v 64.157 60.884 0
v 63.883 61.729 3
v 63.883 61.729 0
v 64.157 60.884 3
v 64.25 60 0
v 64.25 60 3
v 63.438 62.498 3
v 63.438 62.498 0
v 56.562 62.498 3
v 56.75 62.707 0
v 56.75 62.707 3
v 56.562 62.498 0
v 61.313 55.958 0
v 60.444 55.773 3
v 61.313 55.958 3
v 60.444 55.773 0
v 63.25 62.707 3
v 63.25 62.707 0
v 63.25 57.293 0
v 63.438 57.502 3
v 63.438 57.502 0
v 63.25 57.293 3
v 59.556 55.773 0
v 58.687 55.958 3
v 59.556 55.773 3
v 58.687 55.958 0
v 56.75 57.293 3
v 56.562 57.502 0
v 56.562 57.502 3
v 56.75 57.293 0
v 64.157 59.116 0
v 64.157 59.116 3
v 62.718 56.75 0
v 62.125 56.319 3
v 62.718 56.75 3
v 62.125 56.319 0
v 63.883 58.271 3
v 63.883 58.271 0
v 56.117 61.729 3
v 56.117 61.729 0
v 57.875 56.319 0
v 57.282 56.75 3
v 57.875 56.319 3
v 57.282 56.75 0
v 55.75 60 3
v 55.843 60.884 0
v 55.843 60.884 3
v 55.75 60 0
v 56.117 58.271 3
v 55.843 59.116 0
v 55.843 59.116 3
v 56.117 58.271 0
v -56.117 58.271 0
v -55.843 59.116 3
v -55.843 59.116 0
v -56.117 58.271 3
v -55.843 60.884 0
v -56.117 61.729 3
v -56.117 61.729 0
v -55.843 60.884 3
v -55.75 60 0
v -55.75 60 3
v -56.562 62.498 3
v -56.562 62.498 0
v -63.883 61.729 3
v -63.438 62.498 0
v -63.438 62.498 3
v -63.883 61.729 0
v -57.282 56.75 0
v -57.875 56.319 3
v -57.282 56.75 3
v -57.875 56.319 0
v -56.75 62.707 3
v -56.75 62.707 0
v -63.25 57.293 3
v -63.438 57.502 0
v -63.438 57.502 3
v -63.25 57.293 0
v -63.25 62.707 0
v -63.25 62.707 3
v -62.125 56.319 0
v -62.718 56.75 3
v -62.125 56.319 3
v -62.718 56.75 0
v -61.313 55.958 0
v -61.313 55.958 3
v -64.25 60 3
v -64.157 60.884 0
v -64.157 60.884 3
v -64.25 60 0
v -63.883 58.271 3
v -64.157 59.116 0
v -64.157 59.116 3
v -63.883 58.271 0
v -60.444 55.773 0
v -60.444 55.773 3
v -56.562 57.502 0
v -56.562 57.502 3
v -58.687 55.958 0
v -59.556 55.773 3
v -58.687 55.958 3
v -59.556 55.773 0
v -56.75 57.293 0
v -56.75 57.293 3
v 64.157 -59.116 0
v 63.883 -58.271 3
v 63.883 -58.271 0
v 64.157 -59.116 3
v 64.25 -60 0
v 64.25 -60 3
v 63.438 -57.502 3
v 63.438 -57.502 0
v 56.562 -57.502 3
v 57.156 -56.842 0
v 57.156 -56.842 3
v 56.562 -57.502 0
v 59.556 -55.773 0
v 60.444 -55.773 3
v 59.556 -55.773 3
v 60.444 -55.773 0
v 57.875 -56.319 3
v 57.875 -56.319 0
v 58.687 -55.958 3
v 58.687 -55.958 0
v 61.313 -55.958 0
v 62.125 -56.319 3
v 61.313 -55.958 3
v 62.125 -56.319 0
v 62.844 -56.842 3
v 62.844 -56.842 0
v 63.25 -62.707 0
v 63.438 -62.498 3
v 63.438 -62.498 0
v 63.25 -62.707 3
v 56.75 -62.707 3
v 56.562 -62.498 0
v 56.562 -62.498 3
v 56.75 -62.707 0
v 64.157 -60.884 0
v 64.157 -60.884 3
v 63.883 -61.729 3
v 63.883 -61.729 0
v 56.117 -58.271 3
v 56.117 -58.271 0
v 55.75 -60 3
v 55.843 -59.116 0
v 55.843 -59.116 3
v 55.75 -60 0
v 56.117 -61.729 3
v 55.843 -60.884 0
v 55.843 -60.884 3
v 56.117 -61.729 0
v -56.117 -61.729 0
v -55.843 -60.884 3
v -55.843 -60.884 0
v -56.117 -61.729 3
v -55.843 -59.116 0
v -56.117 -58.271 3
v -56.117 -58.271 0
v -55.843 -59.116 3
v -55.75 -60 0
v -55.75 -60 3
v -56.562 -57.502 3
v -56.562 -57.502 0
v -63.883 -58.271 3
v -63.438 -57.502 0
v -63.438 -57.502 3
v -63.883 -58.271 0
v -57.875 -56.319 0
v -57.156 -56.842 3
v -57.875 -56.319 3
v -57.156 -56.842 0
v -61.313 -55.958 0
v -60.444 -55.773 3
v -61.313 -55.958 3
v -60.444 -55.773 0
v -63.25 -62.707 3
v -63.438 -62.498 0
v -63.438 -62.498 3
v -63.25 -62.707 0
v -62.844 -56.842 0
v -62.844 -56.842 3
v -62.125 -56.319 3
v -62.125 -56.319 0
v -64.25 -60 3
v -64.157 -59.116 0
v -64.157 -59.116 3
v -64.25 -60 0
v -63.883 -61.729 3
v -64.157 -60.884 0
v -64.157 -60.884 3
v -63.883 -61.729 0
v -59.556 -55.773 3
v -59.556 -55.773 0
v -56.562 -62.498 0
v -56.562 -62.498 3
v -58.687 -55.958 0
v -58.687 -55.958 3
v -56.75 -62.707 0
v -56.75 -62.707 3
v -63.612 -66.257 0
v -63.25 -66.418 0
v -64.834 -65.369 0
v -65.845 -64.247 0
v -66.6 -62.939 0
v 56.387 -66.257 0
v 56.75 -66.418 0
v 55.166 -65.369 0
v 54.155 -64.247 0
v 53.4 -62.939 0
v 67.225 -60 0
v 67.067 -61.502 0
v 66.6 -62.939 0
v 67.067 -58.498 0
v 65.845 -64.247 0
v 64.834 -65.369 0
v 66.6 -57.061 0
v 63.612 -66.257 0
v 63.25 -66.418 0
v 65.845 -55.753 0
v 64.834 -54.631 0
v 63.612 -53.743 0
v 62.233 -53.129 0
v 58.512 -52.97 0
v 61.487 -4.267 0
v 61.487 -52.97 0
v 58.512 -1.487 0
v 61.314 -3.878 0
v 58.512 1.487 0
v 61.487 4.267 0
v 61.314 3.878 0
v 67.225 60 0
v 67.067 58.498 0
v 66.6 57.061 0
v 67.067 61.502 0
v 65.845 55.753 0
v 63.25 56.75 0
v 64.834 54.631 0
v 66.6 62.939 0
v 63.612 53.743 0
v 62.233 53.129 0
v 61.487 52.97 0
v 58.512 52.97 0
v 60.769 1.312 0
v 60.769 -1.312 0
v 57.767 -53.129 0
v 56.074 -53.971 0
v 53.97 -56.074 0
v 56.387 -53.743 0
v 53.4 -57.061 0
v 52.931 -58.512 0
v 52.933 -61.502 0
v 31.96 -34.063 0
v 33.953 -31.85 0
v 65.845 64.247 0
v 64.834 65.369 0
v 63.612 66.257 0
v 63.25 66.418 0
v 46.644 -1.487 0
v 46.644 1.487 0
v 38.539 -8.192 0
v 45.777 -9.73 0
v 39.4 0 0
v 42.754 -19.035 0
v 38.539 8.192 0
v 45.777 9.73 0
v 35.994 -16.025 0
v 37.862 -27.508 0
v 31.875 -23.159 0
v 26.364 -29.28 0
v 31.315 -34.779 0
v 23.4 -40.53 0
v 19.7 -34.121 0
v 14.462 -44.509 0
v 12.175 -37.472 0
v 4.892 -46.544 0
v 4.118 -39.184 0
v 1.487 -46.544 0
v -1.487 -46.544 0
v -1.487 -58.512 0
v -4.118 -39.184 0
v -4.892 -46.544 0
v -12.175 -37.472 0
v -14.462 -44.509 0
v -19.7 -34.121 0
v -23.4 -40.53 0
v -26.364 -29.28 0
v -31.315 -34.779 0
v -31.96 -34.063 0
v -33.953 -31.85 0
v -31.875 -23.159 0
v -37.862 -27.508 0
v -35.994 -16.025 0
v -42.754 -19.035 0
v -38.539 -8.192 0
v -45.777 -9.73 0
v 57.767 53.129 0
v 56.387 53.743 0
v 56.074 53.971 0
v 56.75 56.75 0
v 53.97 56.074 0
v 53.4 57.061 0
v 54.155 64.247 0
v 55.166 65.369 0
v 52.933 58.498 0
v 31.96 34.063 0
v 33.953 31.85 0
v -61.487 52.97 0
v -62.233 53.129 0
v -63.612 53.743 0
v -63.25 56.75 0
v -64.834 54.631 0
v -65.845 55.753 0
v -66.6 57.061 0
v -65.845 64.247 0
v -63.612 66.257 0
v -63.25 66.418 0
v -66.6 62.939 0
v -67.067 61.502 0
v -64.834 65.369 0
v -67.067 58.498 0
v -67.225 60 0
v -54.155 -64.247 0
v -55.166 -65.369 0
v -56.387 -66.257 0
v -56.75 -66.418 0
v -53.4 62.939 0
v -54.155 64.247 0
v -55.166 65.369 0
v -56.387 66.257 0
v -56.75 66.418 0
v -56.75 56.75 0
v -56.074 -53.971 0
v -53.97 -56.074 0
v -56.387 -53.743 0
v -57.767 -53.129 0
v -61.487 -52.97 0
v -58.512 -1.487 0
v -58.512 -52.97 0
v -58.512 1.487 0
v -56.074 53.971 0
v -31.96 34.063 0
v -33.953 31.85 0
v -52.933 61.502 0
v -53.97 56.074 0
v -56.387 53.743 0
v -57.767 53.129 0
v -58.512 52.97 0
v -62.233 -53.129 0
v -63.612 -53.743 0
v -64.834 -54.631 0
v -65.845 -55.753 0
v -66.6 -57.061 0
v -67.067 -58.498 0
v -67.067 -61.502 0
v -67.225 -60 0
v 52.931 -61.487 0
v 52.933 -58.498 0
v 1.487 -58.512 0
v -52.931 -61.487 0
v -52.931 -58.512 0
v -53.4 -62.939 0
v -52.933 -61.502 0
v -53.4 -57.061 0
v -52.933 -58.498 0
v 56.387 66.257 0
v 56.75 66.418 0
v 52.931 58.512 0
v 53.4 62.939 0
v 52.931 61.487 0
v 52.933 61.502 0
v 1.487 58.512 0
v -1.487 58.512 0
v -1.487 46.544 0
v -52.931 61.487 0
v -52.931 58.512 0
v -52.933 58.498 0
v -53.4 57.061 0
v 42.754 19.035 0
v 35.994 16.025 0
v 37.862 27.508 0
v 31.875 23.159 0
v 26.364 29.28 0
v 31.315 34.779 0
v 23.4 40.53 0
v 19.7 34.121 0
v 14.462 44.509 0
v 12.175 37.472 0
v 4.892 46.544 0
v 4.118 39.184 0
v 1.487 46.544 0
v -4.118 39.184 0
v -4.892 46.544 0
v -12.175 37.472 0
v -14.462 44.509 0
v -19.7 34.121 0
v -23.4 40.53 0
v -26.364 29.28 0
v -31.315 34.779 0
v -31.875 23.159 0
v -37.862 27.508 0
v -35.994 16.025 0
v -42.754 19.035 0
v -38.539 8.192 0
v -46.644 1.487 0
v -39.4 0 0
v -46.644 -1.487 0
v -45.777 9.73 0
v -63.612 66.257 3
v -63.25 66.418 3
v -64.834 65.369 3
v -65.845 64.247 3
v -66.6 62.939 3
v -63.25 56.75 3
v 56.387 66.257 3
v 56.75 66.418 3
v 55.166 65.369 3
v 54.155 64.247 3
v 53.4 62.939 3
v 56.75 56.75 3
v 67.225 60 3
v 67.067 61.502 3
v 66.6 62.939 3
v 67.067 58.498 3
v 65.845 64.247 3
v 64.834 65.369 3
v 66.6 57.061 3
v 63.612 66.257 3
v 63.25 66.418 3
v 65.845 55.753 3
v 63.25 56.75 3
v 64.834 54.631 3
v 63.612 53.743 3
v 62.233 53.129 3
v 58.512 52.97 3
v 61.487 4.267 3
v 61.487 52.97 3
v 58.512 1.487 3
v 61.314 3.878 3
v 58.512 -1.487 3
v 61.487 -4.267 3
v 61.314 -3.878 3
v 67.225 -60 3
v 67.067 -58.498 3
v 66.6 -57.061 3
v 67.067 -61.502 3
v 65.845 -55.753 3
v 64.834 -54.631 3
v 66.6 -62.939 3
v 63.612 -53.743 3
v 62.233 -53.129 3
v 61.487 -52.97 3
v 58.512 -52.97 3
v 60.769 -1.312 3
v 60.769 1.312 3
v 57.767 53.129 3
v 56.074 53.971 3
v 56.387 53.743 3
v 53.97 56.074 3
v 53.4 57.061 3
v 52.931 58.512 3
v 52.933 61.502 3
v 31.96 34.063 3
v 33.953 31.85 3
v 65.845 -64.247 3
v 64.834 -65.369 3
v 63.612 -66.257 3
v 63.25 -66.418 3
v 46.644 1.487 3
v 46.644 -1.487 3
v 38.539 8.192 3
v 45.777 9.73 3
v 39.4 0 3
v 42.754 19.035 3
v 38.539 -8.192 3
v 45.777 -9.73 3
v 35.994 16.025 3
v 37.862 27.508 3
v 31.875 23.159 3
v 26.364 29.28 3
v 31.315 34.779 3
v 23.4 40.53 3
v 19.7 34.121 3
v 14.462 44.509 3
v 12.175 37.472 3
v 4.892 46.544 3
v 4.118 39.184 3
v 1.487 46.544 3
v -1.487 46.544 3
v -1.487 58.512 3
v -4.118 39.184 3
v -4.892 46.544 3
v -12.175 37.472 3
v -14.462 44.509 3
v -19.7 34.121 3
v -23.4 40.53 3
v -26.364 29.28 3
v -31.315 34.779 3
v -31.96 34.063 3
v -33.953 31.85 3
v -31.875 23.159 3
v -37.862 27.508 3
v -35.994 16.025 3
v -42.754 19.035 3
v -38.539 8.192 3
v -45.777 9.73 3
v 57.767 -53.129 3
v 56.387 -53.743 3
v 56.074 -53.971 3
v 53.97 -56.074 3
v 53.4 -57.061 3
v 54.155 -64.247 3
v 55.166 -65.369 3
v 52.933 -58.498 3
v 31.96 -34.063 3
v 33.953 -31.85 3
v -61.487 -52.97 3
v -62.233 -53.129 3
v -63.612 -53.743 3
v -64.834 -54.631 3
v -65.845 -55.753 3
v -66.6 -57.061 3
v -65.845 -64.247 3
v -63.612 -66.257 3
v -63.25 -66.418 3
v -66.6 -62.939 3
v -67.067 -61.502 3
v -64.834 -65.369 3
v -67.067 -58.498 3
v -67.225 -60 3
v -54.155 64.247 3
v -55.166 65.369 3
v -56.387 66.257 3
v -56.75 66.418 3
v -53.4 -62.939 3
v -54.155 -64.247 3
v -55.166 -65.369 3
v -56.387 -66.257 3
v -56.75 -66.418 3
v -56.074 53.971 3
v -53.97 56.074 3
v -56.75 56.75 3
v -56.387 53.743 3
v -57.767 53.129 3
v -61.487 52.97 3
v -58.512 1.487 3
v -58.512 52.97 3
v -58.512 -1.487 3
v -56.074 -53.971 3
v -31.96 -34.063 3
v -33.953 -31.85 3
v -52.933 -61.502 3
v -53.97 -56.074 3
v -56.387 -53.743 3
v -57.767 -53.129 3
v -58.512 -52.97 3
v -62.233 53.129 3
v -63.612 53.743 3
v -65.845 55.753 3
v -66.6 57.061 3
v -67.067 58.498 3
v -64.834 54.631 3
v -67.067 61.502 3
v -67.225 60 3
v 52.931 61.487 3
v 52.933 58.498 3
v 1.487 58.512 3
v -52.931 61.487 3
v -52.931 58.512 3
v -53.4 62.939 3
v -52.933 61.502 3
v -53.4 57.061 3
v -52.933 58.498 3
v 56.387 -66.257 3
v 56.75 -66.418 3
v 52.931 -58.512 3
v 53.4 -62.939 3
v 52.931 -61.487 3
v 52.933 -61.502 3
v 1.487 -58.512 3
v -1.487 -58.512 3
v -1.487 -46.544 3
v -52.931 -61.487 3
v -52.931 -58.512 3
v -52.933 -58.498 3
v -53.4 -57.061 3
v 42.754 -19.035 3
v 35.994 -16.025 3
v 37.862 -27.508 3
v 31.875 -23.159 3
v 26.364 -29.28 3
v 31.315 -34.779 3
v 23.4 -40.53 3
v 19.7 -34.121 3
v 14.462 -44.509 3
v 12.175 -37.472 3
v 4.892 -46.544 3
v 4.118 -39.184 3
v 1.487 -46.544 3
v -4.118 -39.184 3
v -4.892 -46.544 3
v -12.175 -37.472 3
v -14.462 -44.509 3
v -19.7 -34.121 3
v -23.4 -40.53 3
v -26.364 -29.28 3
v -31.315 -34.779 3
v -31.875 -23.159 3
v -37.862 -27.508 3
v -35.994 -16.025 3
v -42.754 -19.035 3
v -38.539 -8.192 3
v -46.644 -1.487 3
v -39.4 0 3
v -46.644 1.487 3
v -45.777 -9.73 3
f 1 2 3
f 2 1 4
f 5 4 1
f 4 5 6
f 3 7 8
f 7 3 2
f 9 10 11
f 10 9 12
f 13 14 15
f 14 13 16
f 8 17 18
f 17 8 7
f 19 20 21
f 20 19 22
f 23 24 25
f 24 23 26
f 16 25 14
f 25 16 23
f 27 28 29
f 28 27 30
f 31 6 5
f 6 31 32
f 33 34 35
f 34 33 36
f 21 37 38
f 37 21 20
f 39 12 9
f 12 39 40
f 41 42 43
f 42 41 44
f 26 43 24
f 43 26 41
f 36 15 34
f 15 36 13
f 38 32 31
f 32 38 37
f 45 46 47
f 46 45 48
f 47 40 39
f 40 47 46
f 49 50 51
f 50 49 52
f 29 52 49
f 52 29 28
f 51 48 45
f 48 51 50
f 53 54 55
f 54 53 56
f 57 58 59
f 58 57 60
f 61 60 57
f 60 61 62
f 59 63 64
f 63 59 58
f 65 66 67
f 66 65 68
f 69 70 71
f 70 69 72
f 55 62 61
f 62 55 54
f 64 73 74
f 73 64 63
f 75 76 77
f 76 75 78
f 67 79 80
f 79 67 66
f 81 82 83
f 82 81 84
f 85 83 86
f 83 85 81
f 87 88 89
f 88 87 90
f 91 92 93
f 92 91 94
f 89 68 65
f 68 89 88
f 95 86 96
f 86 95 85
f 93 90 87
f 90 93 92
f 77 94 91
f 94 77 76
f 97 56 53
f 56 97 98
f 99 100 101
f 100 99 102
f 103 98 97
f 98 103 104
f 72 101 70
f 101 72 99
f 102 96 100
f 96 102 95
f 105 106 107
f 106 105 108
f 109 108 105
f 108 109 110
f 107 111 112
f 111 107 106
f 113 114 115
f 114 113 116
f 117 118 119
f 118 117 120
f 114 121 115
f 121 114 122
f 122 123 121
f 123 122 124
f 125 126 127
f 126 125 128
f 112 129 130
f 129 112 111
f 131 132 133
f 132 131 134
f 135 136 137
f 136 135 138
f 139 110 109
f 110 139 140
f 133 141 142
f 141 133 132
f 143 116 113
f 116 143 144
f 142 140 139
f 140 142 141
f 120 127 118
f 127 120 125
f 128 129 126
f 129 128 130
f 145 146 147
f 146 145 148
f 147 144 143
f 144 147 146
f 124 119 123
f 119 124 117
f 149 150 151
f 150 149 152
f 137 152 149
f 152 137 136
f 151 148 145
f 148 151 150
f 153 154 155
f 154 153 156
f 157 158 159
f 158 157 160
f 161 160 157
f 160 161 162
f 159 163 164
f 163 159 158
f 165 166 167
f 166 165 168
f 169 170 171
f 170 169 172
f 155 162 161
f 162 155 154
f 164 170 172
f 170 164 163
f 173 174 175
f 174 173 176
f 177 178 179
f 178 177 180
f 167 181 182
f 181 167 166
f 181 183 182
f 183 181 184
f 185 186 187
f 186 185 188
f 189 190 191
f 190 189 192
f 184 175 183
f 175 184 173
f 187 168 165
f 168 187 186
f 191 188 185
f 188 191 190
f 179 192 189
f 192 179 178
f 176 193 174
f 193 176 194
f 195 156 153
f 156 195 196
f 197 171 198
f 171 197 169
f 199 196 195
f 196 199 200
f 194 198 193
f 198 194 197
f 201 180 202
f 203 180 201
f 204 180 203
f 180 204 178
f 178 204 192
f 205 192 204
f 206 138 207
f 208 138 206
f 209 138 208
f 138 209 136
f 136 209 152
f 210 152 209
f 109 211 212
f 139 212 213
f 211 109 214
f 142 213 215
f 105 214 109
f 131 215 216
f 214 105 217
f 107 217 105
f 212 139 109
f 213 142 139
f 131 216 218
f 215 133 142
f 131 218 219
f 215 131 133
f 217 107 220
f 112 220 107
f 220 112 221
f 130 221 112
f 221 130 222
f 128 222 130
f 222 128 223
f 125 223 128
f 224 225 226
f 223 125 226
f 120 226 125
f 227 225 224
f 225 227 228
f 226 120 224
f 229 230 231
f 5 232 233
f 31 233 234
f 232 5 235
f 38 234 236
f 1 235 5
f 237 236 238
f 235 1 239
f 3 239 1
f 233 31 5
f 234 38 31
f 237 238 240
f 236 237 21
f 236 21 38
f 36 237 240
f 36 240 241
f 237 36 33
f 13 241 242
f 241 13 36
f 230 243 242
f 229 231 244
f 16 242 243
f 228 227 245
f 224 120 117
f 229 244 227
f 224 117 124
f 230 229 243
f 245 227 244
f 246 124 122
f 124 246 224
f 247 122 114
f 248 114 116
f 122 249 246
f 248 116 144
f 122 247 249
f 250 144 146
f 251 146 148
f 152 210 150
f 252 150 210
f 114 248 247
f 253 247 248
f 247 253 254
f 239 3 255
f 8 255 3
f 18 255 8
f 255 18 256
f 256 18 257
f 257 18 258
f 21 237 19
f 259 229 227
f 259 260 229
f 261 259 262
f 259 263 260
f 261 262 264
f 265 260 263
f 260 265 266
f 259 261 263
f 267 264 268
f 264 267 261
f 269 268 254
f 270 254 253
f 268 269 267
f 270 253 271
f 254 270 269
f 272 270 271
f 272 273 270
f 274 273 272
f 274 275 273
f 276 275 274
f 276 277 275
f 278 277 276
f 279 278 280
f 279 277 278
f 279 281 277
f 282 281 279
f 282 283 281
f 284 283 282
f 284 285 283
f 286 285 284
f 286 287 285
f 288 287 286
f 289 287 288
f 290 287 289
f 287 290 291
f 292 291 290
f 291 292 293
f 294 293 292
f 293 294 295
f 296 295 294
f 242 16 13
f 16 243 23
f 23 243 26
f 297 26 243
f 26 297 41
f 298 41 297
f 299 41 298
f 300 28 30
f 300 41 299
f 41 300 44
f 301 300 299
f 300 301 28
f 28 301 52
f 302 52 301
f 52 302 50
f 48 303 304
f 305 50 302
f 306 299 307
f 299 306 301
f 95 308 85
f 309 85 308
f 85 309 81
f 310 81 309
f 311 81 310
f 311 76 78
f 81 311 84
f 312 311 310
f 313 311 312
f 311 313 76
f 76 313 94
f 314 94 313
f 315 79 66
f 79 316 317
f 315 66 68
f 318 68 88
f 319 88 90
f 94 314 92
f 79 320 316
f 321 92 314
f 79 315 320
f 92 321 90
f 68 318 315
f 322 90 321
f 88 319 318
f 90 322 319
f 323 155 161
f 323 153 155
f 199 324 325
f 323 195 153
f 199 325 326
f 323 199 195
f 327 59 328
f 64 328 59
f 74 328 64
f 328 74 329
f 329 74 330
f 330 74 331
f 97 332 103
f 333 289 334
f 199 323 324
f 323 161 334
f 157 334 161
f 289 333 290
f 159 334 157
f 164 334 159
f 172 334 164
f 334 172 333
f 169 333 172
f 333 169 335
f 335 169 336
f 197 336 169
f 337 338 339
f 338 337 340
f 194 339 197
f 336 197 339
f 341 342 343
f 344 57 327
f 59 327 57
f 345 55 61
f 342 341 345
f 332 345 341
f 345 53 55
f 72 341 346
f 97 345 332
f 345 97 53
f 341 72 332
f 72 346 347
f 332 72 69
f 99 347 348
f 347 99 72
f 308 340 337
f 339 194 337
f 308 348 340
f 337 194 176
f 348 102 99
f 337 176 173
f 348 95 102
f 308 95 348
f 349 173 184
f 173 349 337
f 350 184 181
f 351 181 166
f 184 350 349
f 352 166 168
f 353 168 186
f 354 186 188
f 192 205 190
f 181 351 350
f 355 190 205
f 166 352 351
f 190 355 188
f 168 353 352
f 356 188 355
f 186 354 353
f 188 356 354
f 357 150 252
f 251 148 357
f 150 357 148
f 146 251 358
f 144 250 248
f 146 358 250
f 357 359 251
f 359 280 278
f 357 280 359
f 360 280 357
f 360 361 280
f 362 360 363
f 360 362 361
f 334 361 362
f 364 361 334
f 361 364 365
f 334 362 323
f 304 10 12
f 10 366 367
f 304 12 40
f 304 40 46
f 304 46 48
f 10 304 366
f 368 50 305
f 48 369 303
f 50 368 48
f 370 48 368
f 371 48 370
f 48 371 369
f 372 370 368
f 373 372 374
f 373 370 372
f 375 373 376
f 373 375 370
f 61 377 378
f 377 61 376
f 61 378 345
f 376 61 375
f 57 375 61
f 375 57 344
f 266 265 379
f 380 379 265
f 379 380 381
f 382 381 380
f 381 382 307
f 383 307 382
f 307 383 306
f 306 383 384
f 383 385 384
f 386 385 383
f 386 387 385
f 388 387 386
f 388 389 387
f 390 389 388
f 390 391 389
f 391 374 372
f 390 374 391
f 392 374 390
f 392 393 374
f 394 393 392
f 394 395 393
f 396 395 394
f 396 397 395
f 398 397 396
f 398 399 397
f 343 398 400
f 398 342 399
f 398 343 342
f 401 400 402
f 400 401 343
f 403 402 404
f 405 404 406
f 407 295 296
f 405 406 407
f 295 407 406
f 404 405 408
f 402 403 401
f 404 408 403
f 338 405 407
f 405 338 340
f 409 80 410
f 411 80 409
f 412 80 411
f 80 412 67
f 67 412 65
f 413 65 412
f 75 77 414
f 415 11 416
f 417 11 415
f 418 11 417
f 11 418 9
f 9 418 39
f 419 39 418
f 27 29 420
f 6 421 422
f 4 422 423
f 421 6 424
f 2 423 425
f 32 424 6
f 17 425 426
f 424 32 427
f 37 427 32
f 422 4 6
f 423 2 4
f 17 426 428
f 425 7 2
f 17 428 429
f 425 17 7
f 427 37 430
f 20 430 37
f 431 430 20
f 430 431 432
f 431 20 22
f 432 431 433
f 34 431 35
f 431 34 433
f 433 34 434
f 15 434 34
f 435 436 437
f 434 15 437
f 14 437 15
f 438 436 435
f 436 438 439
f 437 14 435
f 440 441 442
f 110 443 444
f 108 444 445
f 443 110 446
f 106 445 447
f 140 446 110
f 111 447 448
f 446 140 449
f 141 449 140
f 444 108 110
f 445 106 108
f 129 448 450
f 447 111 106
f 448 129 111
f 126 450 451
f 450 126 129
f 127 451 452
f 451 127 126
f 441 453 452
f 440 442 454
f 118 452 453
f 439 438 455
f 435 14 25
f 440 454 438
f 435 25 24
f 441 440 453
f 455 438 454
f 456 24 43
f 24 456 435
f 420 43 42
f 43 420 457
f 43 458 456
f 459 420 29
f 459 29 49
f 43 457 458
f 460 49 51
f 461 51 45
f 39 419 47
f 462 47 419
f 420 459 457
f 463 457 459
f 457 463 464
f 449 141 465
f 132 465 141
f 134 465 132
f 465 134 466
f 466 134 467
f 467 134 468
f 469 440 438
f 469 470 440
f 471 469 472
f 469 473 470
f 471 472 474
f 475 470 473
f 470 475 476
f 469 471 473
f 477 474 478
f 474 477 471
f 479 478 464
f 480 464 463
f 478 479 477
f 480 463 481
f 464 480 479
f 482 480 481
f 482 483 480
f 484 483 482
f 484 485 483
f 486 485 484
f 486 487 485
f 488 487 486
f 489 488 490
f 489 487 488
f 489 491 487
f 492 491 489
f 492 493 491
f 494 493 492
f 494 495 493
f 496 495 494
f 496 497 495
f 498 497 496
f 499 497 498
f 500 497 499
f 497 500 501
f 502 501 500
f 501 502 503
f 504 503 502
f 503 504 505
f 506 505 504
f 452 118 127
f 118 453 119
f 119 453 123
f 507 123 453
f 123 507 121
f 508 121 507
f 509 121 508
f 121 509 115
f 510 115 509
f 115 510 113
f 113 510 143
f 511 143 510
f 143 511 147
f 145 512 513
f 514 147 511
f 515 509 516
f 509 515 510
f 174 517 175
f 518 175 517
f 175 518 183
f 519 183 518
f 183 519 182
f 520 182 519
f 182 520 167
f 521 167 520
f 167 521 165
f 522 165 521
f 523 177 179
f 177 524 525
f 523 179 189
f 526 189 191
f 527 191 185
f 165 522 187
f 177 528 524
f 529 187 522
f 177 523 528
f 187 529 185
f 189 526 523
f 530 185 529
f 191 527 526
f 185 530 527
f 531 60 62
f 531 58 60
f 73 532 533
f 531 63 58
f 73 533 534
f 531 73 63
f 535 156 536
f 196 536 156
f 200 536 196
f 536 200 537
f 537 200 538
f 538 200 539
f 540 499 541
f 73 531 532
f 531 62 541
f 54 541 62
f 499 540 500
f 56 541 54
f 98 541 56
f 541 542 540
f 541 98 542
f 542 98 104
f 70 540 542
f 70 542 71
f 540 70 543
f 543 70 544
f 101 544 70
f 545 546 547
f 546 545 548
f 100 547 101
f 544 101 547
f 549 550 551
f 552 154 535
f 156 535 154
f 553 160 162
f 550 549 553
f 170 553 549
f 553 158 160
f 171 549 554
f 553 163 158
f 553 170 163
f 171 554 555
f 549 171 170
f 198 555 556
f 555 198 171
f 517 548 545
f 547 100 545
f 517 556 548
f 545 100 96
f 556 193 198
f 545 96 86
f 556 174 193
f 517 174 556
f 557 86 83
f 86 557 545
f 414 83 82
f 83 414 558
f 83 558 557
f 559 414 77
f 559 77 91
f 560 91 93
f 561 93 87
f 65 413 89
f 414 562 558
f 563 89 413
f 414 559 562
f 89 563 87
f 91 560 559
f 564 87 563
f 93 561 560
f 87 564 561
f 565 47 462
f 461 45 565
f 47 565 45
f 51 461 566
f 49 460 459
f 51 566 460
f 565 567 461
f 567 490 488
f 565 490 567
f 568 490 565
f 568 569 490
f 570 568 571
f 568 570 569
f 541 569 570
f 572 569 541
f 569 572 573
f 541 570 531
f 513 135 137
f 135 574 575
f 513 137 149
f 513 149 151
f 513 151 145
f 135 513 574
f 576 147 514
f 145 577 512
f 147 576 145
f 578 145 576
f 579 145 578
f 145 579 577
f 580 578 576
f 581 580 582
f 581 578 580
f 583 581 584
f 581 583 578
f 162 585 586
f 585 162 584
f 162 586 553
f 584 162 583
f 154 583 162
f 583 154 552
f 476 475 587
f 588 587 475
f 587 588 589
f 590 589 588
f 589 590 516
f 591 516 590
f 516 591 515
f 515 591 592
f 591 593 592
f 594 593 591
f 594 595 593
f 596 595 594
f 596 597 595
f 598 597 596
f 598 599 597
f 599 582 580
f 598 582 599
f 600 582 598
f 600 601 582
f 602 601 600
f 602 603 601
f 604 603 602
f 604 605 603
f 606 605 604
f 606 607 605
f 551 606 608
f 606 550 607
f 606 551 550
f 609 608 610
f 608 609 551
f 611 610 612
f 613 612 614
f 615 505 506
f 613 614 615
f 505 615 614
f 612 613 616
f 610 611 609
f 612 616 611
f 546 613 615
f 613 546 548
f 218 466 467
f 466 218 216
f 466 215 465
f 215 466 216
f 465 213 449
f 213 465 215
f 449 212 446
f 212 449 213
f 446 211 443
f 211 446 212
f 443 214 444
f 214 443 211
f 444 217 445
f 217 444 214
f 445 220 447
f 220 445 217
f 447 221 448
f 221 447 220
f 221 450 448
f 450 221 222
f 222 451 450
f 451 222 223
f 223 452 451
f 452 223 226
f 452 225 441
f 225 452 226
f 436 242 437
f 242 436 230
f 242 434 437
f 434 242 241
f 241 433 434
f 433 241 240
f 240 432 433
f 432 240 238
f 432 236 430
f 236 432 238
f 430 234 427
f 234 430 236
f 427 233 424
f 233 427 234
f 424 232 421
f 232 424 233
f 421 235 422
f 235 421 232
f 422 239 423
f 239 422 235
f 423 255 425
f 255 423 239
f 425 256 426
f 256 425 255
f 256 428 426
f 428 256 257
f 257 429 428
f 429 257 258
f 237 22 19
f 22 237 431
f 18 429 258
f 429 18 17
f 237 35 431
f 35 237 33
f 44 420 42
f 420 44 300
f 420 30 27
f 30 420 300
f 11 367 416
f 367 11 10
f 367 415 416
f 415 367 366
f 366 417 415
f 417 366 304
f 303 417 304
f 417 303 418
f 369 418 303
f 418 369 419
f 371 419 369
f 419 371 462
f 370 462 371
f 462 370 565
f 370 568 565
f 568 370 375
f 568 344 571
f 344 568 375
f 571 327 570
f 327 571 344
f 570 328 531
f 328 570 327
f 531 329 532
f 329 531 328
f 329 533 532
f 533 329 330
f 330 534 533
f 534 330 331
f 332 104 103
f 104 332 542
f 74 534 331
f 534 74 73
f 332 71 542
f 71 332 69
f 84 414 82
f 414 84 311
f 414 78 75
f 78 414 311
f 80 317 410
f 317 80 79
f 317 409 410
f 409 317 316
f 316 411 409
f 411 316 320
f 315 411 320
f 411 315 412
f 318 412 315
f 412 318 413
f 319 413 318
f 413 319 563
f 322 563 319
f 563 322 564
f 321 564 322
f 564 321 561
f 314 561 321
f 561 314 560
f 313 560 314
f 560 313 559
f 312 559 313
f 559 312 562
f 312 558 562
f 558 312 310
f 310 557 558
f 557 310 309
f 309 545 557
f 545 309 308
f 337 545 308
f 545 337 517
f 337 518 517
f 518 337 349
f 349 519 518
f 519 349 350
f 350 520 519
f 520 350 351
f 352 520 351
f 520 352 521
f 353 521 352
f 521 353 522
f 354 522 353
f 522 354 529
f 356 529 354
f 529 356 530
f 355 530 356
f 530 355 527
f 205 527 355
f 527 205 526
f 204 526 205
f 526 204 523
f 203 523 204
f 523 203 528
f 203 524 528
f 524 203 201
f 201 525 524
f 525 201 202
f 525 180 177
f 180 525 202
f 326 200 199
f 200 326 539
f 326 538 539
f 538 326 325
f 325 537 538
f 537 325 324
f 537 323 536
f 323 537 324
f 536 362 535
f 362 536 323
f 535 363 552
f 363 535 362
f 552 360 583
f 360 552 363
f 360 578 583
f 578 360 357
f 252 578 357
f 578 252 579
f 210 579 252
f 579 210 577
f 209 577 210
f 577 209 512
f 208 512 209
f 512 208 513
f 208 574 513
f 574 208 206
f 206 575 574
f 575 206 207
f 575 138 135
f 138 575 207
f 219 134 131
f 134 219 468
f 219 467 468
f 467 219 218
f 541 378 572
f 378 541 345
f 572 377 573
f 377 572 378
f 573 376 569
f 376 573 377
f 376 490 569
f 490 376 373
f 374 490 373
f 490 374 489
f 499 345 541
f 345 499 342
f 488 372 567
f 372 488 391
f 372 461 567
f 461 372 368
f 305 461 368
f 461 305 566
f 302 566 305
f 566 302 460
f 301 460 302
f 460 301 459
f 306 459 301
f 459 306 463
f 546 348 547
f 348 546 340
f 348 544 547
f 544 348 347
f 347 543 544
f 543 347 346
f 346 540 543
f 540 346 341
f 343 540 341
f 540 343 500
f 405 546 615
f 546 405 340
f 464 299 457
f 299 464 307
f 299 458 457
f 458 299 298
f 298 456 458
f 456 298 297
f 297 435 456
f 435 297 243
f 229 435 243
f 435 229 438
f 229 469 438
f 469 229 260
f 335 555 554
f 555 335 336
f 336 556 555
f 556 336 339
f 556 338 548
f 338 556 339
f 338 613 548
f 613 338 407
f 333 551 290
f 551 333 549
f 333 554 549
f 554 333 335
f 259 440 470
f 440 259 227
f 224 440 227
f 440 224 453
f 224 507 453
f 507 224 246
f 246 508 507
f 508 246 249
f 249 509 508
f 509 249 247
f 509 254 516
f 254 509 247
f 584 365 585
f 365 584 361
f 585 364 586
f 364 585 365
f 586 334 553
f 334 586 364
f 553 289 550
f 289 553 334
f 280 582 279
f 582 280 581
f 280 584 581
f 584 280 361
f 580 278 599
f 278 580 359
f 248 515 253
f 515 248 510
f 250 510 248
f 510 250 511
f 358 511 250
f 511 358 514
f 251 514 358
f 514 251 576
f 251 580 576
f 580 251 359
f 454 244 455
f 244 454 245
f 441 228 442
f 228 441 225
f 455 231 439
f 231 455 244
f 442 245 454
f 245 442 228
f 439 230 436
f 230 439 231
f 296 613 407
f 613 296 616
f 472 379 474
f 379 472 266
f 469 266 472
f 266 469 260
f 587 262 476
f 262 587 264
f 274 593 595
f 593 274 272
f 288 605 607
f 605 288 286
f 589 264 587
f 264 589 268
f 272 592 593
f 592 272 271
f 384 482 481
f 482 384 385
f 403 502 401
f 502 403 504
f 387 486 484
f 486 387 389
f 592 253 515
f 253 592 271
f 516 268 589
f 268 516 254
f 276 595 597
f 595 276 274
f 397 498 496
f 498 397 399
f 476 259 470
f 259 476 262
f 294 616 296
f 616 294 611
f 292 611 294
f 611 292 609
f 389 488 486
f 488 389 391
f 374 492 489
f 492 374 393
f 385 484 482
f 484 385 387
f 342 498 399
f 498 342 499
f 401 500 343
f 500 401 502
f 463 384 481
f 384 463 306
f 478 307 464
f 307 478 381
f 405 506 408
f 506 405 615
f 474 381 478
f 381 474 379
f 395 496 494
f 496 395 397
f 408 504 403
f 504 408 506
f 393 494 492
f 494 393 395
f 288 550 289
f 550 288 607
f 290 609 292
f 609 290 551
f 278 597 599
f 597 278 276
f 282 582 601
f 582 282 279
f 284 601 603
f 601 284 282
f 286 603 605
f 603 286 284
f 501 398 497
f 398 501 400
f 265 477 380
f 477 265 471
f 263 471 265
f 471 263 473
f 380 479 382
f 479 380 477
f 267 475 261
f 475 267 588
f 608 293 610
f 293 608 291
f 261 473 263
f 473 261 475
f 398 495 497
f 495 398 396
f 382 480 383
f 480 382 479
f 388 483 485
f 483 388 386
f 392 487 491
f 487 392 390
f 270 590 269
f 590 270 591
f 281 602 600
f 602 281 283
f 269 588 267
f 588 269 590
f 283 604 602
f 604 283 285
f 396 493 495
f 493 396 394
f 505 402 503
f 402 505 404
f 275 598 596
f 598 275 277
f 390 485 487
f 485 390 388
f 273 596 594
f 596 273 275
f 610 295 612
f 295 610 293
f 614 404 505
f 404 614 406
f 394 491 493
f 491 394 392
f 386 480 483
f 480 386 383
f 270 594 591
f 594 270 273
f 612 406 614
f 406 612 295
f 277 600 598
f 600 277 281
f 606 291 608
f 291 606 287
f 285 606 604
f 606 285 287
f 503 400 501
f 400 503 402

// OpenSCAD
// file: trapezoid_groove.scad
module trapezoid_groove(
    d = 20,
    belt_width=2,
    slope=.5,
    ){
        inside_corner=belt_width/2;
        outside_corner_x=
            inside_corner
            +belt_width*4;
        outside_corner_y=
            inside_corner 
            + outside_corner_x*slope;
        
        rotate_extrude()
        translate([d/2,0,0])
        polygon(points=[
            [0,-inside_corner],[0,inside_corner],
            [outside_corner_x,outside_corner_y],
            [outside_corner_x,-outside_corner_y],
        ]);
}
// file: bearing.scad
$fn=30;
drive_axle_r = 8.1/2;
drive_axle_bearing_id = 8;
drive_axle_bearing_od = 22.5;
drive_axle_bearing_t = 8;

bearing_holder_wall = 1.2;
bearing_holder_tie_hole_r = 3/2;
bearing_holder_cut = -1;

bearing_pillow_rim_t = 2;
bearing_pillow_side_t = 1.5;
bearing_pillow_screw_thread_r = 3/2;
bearing_pillow_screw_shank_r = 4/2;
bearing_pillow_screw_head_r = 6/2;

module bearing(id = drive_axle_bearing_id, od = drive_axle_bearing_od, t = drive_axle_bearing_t) {
    difference() {
        cylinder(r=od/2, h=t, center=true);
        cylinder(r=id/2, h=t*2, center=true);
    }
}

module bearing_holder(
    od = drive_axle_bearing_od,
    t = drive_axle_bearing_t,
    wall=bearing_holder_wall,
    tie_hole_r = bearing_holder_tie_hole_r
) {
    extra_length = wall*4 + tie_hole_r*4;
    tie_width = wall*2 + tie_hole_r*6;
    difference() {
        union() {
            cylinder(r=od/2+wall, h=t+wall*2, center=true);
            cube([od+extra_length,tie_width,t+wall*2], center=true);
        }
        cylinder(r=od/2-wall, h=t*3, center=true);
        bearing();
        translate([od/2+wall+tie_hole_r,tie_hole_r*2,0])
        cylinder(r=tie_hole_r, h=t*2, center=true);
        translate([-od/2-wall-tie_hole_r,tie_hole_r*2,0])
        cylinder(r=tie_hole_r, h=t*2, center=true);

        translate([od/2+wall+tie_hole_r,-tie_hole_r*2,0])
        cylinder(r=tie_hole_r, h=t*2, center=true);
        translate([-od/2-wall-tie_hole_r,-tie_hole_r*2,0])
        cylinder(r=tie_hole_r, h=t*2, center=true);
    }
}

module bearing_holder_negative(
    od = drive_axle_bearing_od,
    t = drive_axle_bearing_od +bearing_pillow_rim_t*2,
    wall=bearing_pillow_side_t,
    //tie_hole_r = bearing_holder_tie_hole_r
) {
    //extra_length = wall*4 + tie_hole_r*4-.2;
    //tie_width = wall*2 + tie_hole_r*6-.2;
        union() {
            cylinder(r=od/2+wall-.2, h=t+wall*2, center=true);
          //  cube([od+extra_length,tie_width,t+wall*2], center=true);
        }
     
}
//bearing_holder_negative();

module bearing_holder_bottom(
    od = drive_axle_bearing_od,
    t = drive_axle_bearing_t,
    wall=bearing_holder_wall,
    cut = bearing_holder_cut
) {
    
    difference() {
        bearing_holder();
        translate([0,0,od*3/2-cut])
        cube([od*2,od*3,od*3], center=true);
        translate([0,0,-cut])
        bearing_holder_keyway();
    }
}
//bearing_holder_bottom();

module bearing_holder_top(
    od = drive_axle_bearing_od,
    t = drive_axle_bearing_t,
    wall=bearing_holder_wall,
    cut = bearing_holder_cut
) {
    
    difference() {
        bearing_holder(od=od, t=t, wall=wall, cut=cut);
        translate([0,0,-od*3/2-cut])
        cube([od*2,od*3,od*3], center=true);
    }
    translate([0,0,-cut])
    bearing_holder_key();
}
//rotate(180,[1,0,0])
//bearing_holder_top();

module bearing_holder_pair(
    od = drive_axle_bearing_od,
    t = drive_axle_bearing_t,
    wall=bearing_holder_wall
){
    translate([0,-od/2-wall-2,t/2+wall])
    rotate(180, [0,1,0])
    bearing_holder_top();
    translate([0,od/2+wall+2,t/2+wall])
    bearing_holder_bottom();
}
//bearing_holder_pair();

module bearing_holder_key(
    od = drive_axle_bearing_od,
    t = drive_axle_bearing_t,
    wall=bearing_holder_wall,
    tie_hole_r = bearing_holder_tie_hole_r
) {
    translate([od/2+wall+tie_hole_r,0,0])
    cube([tie_hole_r*2,tie_hole_r,tie_hole_r], center=true);
    translate([-od/2-wall-tie_hole_r,0,0])
    cube([tie_hole_r*2,tie_hole_r,tie_hole_r], center=true);
}
module bearing_holder_keyway(
    od = drive_axle_bearing_od,
    t = drive_axle_bearing_t,
    wall=bearing_holder_wall,
    tie_hole_r = bearing_holder_tie_hole_r,
    clearance = 1
) {
    translate([od/2+wall+tie_hole_r,0,0])
    cube([tie_hole_r*2+clearance,tie_hole_r+clearance,tie_hole_r+clearance], center=true);
    translate([-od/2-wall-tie_hole_r,0,0])
    cube([tie_hole_r*2+clearance,tie_hole_r+clearance,tie_hole_r+clearance], center=true);
}

module bearing_pillow() {

    difference() {
        union() {
            cylinder(r=drive_axle_bearing_od/2 + bearing_pillow_rim_t, h=drive_axle_bearing_t + bearing_pillow_side_t*2, center=true);
            cube([drive_axle_bearing_od+bearing_pillow_rim_t*2+bearing_pillow_screw_head_r*4+2,12,drive_axle_bearing_t + bearing_pillow_side_t*2], center=true);
        }
      cylinder(r=drive_axle_bearing_od/2 - 1, h=drive_axle_bearing_t*8, center=true);
      bearing();
        
      translate([drive_axle_bearing_od/2+bearing_pillow_rim_t+bearing_pillow_screw_head_r,0,0])
        rotate(90,[1,0,0]) 
            cylinder(r=bearing_pillow_screw_thread_r, h=50, center=true);
      translate([drive_axle_bearing_od/2+bearing_pillow_rim_t+bearing_pillow_screw_head_r,10,0])
        rotate(90,[1,0,0]) 
            cylinder(r=bearing_pillow_screw_shank_r, h=20, center=true);
      translate([drive_axle_bearing_od/2+bearing_pillow_rim_t+bearing_pillow_screw_head_r,15,0])
        rotate(90,[1,0,0]) 
            cylinder(r=bearing_pillow_screw_head_r, h=20, center=true);

      translate([-drive_axle_bearing_od/2-bearing_pillow_rim_t-bearing_pillow_screw_head_r,0,0])
        rotate(90,[1,0,0]) 
            cylinder(r=bearing_pillow_screw_thread_r, h=50, center=true);
      translate([-drive_axle_bearing_od/2-bearing_pillow_rim_t-bearing_pillow_screw_head_r,10,0])
        rotate(90,[1,0,0]) 
            cylinder(r=bearing_pillow_screw_shank_r, h=20, center=true);
      translate([-drive_axle_bearing_od/2-bearing_pillow_rim_t-bearing_pillow_screw_head_r,15,0])
        rotate(90,[1,0,0]) 
            cylinder(r=bearing_pillow_screw_head_r, h=20, center=true);
    }
}
module bearing_pillow_negative() {

    cylinder(r=drive_axle_bearing_od/2 + bearing_pillow_rim_t, h=drive_axle_bearing_t + bearing_pillow_side_t*2, center=true);
    cylinder(r=drive_axle_bearing_od/2 + bearing_pillow_rim_t-1, h=drive_axle_bearing_t *4, center=true);
    cube([drive_axle_bearing_od+bearing_pillow_rim_t*2+bearing_pillow_screw_head_r*4+2,12,drive_axle_bearing_t + bearing_pillow_side_t*2], center=true);

}
//%bearing_pillow();
//bearing_pillow_negative();
module bearing_pillow_top() {
   difference() {
        bearing_pillow();
        translate([0,-50,0])
            cube([100,100,100], center=true);
   } 
}
module bearing_pillow_bottom() {
   difference() {
        bearing_pillow();
        translate([0,50,0])
            cube([100,100,100], center=true);
   } 
}
//bearing_pillow_top();
//translate([0,-5,0])
//bearing_pillow_bottom();
//bearing_pillow();
//bearing_holder();
//bearing();
// file: rods.scad
//include <tracer.scad>
//include <tracer_bearing.scad>
include <bearing.scad>

$fn = 60;

frame_x = 60*2;
frame_y = frame_x;

frame_rod_r = 6.5/2;
frame_length = 500;

drive_axle_r = 8.5/2;
//inboard
//drive_position_x = frame_x/2 - drive_axle_bearing_od/2 - bearing_holder_wall - frame_rod_r;
//drive_position_y = frame_y/2 - drive_axle_bearing_od/2 - bearing_holder_wall - frame_rod_r;
//outboard
drive_position_x = frame_x/2+ drive_axle_bearing_od/2+bearing_pillow_rim_t;
drive_position_y = 0;
drive_axle_bearing_od = 22;

module frame_rod(r = frame_rod_r, h = frame_length) {
    cylinder(r =r, h = h);
}
module drive_axle(r = drive_axle_r, h = frame_length) {
    cylinder(r =r, h = h);
}
//frame_rod();


module frame_rods(x=frame_x, y = frame_y, r = frame_rod_r) {
    translate([x/2,y/2,0])
        frame_rod(r = r);
    translate([-x/2,y/2,0])
        frame_rod(r = r);
    translate([x/2,-y/2,0])
        frame_rod(r = r);
    translate([-x/2,-y/2,0])
        frame_rod(r = r);
    translate([drive_position_x,drive_position_y,0])
        drive_axle();
}

//frame_rods();
// file: rb-pulleys.scad
include <trapezoid_groove.scad>

module belt_pulley(
    d = 20,
    shaft_d=4,
    belt_width=2,
    slope=.5,
    t=5
    ){
    
    difference() {
        cylinder(r=d/2+belt_width,h=t, center=true);
        
        cylinder(r=shaft_d/2,h=belt_width*5, center=true);
        
        trapezoid_groove(
            d = d,
            belt_width=belt_width,
            slope=slope
        );
    }
}

module double_pulley(
    d1=15,
    d2=10,
    t=5,
    shaft_d=4,
    belt_width=2,
    slope=.5,
    ) {
    
    translate([0,0,t/2])
    belt_pulley(
        d=d1,
        t=t,
        shaft_d=shaft_d,
        belt_width=belt_width,
        slope=slope
    );
    translate([0,0,t+t/2])
    belt_pulley(
        d=d2,
        t=t,
        shaft_d=shaft_d,
        belt_width=belt_width,
        slope=slope
    );    

}



//belt_pulley();
//reducer_pulley(d1=10,d2=20);
//dia_1=30;

//double_pulley(d1=dia_1,d2=dia_1/4,belt_width=25.4/8,t=7);



//double_pulley(d1=7,d2=15,t=2);
//double_pulley(d1=20,d2=8);
// file: hollow_bearing.scad
include <trapezoid_groove.scad>

inner_hole_r = 10;
shell_wall = 2;
inner_shell_wall = shell_wall;
outer_shell_wall = shell_wall/2;
shell_t = 2; 
flange_w = shell_t*2;
inner_outer_tolerance = .8;
journal_t = 2;
journal_tolerance = 1.2;
journal_tolerance_z = .6;

retainer_t = 1;
retainer_d = inner_shell_wall /2;
retainer_w = retainer_d*2+inner_outer_tolerance;
retainer_tolerance=.4;

shell_r = inner_hole_r + inner_shell_wall + outer_shell_wall + inner_outer_tolerance + flange_w ;
inner_shell_h = journal_t + shell_t*2 + retainer_t*2 + journal_tolerance_z+retainer_tolerance*2;
outer_shell_h = journal_t + shell_t +journal_tolerance_z;


module center_hole(r=inner_hole_r, h=inner_shell_h*8) {
      cylinder(r=r, h=h, center=true);  
}

module retainer_slot(r=inner_hole_r+shell_wall-retainer_d, h=retainer_t+retainer_tolerance) {
    trapezoid_groove(
        d = r*2,
        belt_width=h,
        slope=.4
    );
}

module retainer_ring(r=inner_hole_r+shell_wall-retainer_d, h=retainer_t) {
    difference() {
        cylinder(r=r+retainer_w, h=h, center=true);  
        cylinder(r=r, h=h*2, center=true);
        translate([r+retainer_w/2,0,0])  
            cube([retainer_d*4,retainer_w/2,retainer_t*2], center=true);
    }
}

module translate_retainer() {
        translate([0,0,shell_t*2+journal_t+journal_tolerance_z+retainer_tolerance+retainer_t/2])
        children();
}


module inner_shell(extra_length = 0) {
    //translate([0,0,inner_shell_h/2])
    difference() {
        union() {
            cylinder(r=inner_hole_r+shell_wall, h=inner_shell_h+extra_length);
            //translate([0,0,-inner_shell_h/2+shell_t/2])
           cylinder(r=shell_r, h=shell_t);
        } 
        
        center_hole(r=inner_hole_r);
        translate_retainer()
        retainer_slot();
    }
}

module outer_shell_hole(r=inner_hole_r+inner_shell_wall+inner_outer_tolerance/2, h=60) {
      cylinder(r=r, h=h, center=true);  
}

module outer_shell() {
    translate([0,0,-outer_shell_h/2])
    difference() {
        union() {
            cylinder(r=inner_hole_r+inner_shell_wall+inner_outer_tolerance+outer_shell_wall, h=outer_shell_h, center=true);
            translate([0,0,outer_shell_h/2-shell_t/2])
           cylinder(r=shell_r, h=shell_t, center=true);
        } 
        
        outer_shell_hole();
    }
}

module journal_hole(r=inner_hole_r+inner_shell_wall+outer_shell_wall+journal_tolerance/2+inner_outer_tolerance, h=60) {
      cylinder(r=r, h=h, center=true);  
}

module journal(r = shell_r+flange_w, t = journal_t) {
    difference() {
    cylinder (r=r, h = t, center=true);
        journal_hole();
    }
}



module hollow_bearing_assembly() {
    rotate(180, [0,1,0]) {
        
//intersection() {
translate([0,0,shell_t+journal_t/2+journal_tolerance_z/2])
outer_shell();

    translate([0,0,-shell_t-journal_t/2-journal_tolerance_z/2]) {
    inner_shell();
   translate_retainer()
retainer_ring();
}
    

journal();
//}
}
}
//hollow_bearing_assembly();


module hollow_bearing_print_all() {
translate([0,0,0])
rotate(180, [0,1,0])
outer_shell();
translate([shell_r*2+4,0,0]) 
    inner_shell();
    
translate([0,shell_r*2+flange_w*2,journal_t/2])
journal();
translate([shell_r+flange_w*3+inner_hole_r,shell_r+flange_w*2+inner_hole_r,retainer_t/2])
retainer_ring();
    
}


//hollow_bearing_print_all();
// file: strut.scad
include <rods.scad>
include <bearing.scad>

module strut_2d(x=frame_x, y=frame_y, r = frame_rod_r, meat_factor=.4, ring_r = frame_x/2, do_bearing = 1) {
    
    difference() {
        union() {
                
            translate([x/2,y/2])
                circle(r=r+r*meat_factor);
            translate([-x/2,y/2])
                circle(r=r+r*meat_factor);
            translate([x/2,-y/2])
                circle(r=r+r*meat_factor);
            translate([-x/2,-y/2])
                circle(r=r+r*meat_factor);
            translate([-x/2-r*meat_factor/2,-y/2])
                square(size = [r*meat_factor,y]);
            translate([x/2-r*meat_factor/2,-y/2])
                square(size = [r*meat_factor,y]);
            translate([-x/2,-y/2-r*meat_factor/2])
                square(size = [x,r*meat_factor]);
            translate([-x/2,y/2-r*meat_factor/2])
                square(size = [x,r*meat_factor]);
            rotate(45, [0,0,1])
                translate([-sqrt(x*x+y*y)/2,-r*meat_factor/2])
                    square(size = [sqrt(x*x+y*y),r*meat_factor]);
            rotate(-45, [0,0,1])
                translate([-sqrt(x*x+y*y)/2,-r*meat_factor/2])
                    square(size = [sqrt(x*x+y*y),r*meat_factor]);
            rotate(0, [0,0,1])
                translate([-x/2,-r*meat_factor/2])
                    square(size = [x,r*meat_factor]);
            rotate(90, [0,0,1])
                translate([-y/2,-r*meat_factor/2])
                    square(size = [y,r*meat_factor]);
            circle(r=ring_r);
            if(do_bearing == 1) {
                //outboard bearing support
                translate([x/2,-(drive_axle_bearing_od+bearing_pillow_rim_t*2)/2])
                    square(size = [drive_axle_bearing_od/2+bearing_pillow_rim_t,drive_axle_bearing_od+bearing_pillow_rim_t*2]);
            }
        }
        circle(r=ring_r-r*meat_factor);
        // rod slots
        translate([-x/2-frame_rod_r,-y/2-frame_rod_r*6])
            square(size = [frame_rod_r*2,frame_rod_r*6]);
        translate([x/2-frame_rod_r,-y/2-frame_rod_r*6])
            square(size = [frame_rod_r*2,frame_rod_r*6]);
        translate([-x/2-frame_rod_r,y/2-frame_rod_r])
            square(size = [frame_rod_r*2,frame_rod_r*6]);
        translate([x/2-frame_rod_r,y/2-frame_rod_r])
            square(size = [frame_rod_r*2,frame_rod_r*6]);
    }
}
//strut_2d();

module strut(ring_r = 100, h =3, r = frame_rod_r+1, meat_factor=.6, do_bearing = 1) {
    difference() {
        linear_extrude(height=h)
            strut_2d(r = r, ring_r = ring_r, meat_factor = meat_factor, do_bearing=do_bearing);
        translate([0,0,-frame_length/2])
            frame_rods(r = frame_rod_r+1);
        //translate([frame_x/2/2,frame_y/2,drive_axle_bearing_t/2+1])
     //translate([drive_position_x,drive_position_y,0])
        //translate([0,0,drive_axle_bearing_t/2+bearing_holder_wall-1])
        //rotate(-45,[0,0,1])
        if (do_bearing == 0) {
        //bearing_holder_negative();
        translate([drive_position_x,drive_position_y,0])
            translate([0,0,drive_axle_bearing_t/2+bearing_pillow_side_t])
                rotate(-90,[0,0,1])
                    bearing_holder_negative();  
            
        }
    }
    // Inboard bearing holder
    //translate([drive_position_x,drive_position_y,0])
    //translate([0,0,drive_axle_bearing_t/2+bearing_holder_wall])
    //    rotate(-45,[0,0,1])
    //        bearing_holder_bottom();
    
            if (do_bearing == 1) {

    // Outboard bearing holder
    translate([drive_position_x,drive_position_y,0])
        translate([0,0,drive_axle_bearing_t/2+bearing_pillow_side_t])
            rotate(-90,[0,0,1])
                bearing_pillow_bottom();
    translate([frame_x/2+.1,0,0])
    //cube([10,10,10],center=true);
            rotate(180,[0,0,1])
            rotate(90,[1,0,0])
    linear_extrude(height=frame_rod_r/2, center=true)
    polygon([ [0,0], [0,drive_axle_bearing_t+bearing_pillow_side_t*2], [10,0]]);
            }
}



//strut(ring_r = 45);
// file: tracer_bearing.scad
include <hollow_bearing.scad>
use <rb-pulleys.scad>

$fn = 100;
inner_hole_r = 35;
shell_wall = 2;
inner_shell_wall = shell_wall;
outer_shell_wall = shell_wall/2;
shell_t = 2; 
flange_w = shell_t*2;
inner_outer_tolerance = .8;
journal_t = 3;
journal_tolerance = 1.2;
journal_tolerance_z = .6;

retainer_t = 1;
retainer_d = inner_shell_wall /2;
retainer_w = retainer_d*2+inner_outer_tolerance;
retainer_tolerance=.4;

tracer_pulley_t = 5;
tracer_single_pulley_t = 7;
tracer_pulley_attach = .1;

tracer_pulley_center_z = shell_t+journal_t/2+journal_tolerance_z/2+tracer_pulley_t/2-tracer_pulley_attach;
//tracer_pulley_center_z =0;
//tracer_pulley_center_z =0;
/*
shell_r = inner_hole_r + inner_shell_wall + outer_shell_wall + inner_outer_tolerance + flange_w ;
inner_shell_h = journal_t + shell_t*2 + retainer_t*2 + journal_tolerance_z+retainer_tolerance*2;
outer_shell_h = journal_t + shell_t +journal_tolerance_z;

*/

module tracer_connect_tabs() {
    difference() {
        union() {
            translate([inner_hole_r,0,-tracer_pulley_t+tracer_pulley_attach])
                cylinder(r=5,h=2);
            translate([-inner_hole_r,0,-tracer_pulley_t+tracer_pulley_attach])
                cylinder(r=5,h=2);
        }
         translate([-inner_hole_r+2,0,-tracer_pulley_t+tracer_pulley_attach])
            cylinder(r=1.5,h=10,center=true);
         translate([inner_hole_r-2,0,-tracer_pulley_t+tracer_pulley_attach])
            cylinder(r=1.5,h=10,center=true);
    }    
}
module tracer_inner_shell() {

    inner_shell();
    translate([0,0,-tracer_pulley_t/2+tracer_pulley_attach])
    belt_pulley(
        d = shell_r*2-4,
        shaft_d=inner_hole_r*2,
        belt_width=3,
        slope=.5,
        t= tracer_pulley_t
    );
    tracer_connect_tabs();
}

//tracer_inner_shell();

module tracer_outer_shell() {
    outer_shell();
}

module tracer_journal() {
    journal();

}

module tracer_retainer_ring() {
    retainer_ring();
}

module tracer_center_hole() {
    center_hole();
}

module tracer_bearing_assembly() {
//intersection() {
translate([0,0,shell_t+journal_t/2+journal_tolerance_z/2])
tracer_outer_shell();

    translate([0,0,-shell_t-journal_t/2-journal_tolerance_z/2]) {
    tracer_inner_shell();
   translate_retainer()
tracer_retainer_ring();
}
    

tracer_journal();
//}

}
//tracer_bearing_assembly();

module tracer_bearing_print_all() {
translate([0,0,0])
rotate(180, [0,1,0])
tracer_outer_shell();
translate([shell_r*2+4,0,tracer_pulley_t-tracer_pulley_attach]) 
    tracer_inner_shell();
    
translate([0,shell_r*2+flange_w*2,journal_t/2])
tracer_journal();
translate([shell_r+flange_w*3+inner_hole_r,shell_r+flange_w*2+inner_hole_r,retainer_t/2])
tracer_retainer_ring();
    
}


//tracer_bearing_print_all();
// main file
include <tracer_bearing.scad>
include <strut.scad>
//$fn=100;

strut(ring_r = 45, meat_factor = .7, h=journal_t,do_bearing = 0);
translate([0,0,journal_t/2])
tracer_journal();
